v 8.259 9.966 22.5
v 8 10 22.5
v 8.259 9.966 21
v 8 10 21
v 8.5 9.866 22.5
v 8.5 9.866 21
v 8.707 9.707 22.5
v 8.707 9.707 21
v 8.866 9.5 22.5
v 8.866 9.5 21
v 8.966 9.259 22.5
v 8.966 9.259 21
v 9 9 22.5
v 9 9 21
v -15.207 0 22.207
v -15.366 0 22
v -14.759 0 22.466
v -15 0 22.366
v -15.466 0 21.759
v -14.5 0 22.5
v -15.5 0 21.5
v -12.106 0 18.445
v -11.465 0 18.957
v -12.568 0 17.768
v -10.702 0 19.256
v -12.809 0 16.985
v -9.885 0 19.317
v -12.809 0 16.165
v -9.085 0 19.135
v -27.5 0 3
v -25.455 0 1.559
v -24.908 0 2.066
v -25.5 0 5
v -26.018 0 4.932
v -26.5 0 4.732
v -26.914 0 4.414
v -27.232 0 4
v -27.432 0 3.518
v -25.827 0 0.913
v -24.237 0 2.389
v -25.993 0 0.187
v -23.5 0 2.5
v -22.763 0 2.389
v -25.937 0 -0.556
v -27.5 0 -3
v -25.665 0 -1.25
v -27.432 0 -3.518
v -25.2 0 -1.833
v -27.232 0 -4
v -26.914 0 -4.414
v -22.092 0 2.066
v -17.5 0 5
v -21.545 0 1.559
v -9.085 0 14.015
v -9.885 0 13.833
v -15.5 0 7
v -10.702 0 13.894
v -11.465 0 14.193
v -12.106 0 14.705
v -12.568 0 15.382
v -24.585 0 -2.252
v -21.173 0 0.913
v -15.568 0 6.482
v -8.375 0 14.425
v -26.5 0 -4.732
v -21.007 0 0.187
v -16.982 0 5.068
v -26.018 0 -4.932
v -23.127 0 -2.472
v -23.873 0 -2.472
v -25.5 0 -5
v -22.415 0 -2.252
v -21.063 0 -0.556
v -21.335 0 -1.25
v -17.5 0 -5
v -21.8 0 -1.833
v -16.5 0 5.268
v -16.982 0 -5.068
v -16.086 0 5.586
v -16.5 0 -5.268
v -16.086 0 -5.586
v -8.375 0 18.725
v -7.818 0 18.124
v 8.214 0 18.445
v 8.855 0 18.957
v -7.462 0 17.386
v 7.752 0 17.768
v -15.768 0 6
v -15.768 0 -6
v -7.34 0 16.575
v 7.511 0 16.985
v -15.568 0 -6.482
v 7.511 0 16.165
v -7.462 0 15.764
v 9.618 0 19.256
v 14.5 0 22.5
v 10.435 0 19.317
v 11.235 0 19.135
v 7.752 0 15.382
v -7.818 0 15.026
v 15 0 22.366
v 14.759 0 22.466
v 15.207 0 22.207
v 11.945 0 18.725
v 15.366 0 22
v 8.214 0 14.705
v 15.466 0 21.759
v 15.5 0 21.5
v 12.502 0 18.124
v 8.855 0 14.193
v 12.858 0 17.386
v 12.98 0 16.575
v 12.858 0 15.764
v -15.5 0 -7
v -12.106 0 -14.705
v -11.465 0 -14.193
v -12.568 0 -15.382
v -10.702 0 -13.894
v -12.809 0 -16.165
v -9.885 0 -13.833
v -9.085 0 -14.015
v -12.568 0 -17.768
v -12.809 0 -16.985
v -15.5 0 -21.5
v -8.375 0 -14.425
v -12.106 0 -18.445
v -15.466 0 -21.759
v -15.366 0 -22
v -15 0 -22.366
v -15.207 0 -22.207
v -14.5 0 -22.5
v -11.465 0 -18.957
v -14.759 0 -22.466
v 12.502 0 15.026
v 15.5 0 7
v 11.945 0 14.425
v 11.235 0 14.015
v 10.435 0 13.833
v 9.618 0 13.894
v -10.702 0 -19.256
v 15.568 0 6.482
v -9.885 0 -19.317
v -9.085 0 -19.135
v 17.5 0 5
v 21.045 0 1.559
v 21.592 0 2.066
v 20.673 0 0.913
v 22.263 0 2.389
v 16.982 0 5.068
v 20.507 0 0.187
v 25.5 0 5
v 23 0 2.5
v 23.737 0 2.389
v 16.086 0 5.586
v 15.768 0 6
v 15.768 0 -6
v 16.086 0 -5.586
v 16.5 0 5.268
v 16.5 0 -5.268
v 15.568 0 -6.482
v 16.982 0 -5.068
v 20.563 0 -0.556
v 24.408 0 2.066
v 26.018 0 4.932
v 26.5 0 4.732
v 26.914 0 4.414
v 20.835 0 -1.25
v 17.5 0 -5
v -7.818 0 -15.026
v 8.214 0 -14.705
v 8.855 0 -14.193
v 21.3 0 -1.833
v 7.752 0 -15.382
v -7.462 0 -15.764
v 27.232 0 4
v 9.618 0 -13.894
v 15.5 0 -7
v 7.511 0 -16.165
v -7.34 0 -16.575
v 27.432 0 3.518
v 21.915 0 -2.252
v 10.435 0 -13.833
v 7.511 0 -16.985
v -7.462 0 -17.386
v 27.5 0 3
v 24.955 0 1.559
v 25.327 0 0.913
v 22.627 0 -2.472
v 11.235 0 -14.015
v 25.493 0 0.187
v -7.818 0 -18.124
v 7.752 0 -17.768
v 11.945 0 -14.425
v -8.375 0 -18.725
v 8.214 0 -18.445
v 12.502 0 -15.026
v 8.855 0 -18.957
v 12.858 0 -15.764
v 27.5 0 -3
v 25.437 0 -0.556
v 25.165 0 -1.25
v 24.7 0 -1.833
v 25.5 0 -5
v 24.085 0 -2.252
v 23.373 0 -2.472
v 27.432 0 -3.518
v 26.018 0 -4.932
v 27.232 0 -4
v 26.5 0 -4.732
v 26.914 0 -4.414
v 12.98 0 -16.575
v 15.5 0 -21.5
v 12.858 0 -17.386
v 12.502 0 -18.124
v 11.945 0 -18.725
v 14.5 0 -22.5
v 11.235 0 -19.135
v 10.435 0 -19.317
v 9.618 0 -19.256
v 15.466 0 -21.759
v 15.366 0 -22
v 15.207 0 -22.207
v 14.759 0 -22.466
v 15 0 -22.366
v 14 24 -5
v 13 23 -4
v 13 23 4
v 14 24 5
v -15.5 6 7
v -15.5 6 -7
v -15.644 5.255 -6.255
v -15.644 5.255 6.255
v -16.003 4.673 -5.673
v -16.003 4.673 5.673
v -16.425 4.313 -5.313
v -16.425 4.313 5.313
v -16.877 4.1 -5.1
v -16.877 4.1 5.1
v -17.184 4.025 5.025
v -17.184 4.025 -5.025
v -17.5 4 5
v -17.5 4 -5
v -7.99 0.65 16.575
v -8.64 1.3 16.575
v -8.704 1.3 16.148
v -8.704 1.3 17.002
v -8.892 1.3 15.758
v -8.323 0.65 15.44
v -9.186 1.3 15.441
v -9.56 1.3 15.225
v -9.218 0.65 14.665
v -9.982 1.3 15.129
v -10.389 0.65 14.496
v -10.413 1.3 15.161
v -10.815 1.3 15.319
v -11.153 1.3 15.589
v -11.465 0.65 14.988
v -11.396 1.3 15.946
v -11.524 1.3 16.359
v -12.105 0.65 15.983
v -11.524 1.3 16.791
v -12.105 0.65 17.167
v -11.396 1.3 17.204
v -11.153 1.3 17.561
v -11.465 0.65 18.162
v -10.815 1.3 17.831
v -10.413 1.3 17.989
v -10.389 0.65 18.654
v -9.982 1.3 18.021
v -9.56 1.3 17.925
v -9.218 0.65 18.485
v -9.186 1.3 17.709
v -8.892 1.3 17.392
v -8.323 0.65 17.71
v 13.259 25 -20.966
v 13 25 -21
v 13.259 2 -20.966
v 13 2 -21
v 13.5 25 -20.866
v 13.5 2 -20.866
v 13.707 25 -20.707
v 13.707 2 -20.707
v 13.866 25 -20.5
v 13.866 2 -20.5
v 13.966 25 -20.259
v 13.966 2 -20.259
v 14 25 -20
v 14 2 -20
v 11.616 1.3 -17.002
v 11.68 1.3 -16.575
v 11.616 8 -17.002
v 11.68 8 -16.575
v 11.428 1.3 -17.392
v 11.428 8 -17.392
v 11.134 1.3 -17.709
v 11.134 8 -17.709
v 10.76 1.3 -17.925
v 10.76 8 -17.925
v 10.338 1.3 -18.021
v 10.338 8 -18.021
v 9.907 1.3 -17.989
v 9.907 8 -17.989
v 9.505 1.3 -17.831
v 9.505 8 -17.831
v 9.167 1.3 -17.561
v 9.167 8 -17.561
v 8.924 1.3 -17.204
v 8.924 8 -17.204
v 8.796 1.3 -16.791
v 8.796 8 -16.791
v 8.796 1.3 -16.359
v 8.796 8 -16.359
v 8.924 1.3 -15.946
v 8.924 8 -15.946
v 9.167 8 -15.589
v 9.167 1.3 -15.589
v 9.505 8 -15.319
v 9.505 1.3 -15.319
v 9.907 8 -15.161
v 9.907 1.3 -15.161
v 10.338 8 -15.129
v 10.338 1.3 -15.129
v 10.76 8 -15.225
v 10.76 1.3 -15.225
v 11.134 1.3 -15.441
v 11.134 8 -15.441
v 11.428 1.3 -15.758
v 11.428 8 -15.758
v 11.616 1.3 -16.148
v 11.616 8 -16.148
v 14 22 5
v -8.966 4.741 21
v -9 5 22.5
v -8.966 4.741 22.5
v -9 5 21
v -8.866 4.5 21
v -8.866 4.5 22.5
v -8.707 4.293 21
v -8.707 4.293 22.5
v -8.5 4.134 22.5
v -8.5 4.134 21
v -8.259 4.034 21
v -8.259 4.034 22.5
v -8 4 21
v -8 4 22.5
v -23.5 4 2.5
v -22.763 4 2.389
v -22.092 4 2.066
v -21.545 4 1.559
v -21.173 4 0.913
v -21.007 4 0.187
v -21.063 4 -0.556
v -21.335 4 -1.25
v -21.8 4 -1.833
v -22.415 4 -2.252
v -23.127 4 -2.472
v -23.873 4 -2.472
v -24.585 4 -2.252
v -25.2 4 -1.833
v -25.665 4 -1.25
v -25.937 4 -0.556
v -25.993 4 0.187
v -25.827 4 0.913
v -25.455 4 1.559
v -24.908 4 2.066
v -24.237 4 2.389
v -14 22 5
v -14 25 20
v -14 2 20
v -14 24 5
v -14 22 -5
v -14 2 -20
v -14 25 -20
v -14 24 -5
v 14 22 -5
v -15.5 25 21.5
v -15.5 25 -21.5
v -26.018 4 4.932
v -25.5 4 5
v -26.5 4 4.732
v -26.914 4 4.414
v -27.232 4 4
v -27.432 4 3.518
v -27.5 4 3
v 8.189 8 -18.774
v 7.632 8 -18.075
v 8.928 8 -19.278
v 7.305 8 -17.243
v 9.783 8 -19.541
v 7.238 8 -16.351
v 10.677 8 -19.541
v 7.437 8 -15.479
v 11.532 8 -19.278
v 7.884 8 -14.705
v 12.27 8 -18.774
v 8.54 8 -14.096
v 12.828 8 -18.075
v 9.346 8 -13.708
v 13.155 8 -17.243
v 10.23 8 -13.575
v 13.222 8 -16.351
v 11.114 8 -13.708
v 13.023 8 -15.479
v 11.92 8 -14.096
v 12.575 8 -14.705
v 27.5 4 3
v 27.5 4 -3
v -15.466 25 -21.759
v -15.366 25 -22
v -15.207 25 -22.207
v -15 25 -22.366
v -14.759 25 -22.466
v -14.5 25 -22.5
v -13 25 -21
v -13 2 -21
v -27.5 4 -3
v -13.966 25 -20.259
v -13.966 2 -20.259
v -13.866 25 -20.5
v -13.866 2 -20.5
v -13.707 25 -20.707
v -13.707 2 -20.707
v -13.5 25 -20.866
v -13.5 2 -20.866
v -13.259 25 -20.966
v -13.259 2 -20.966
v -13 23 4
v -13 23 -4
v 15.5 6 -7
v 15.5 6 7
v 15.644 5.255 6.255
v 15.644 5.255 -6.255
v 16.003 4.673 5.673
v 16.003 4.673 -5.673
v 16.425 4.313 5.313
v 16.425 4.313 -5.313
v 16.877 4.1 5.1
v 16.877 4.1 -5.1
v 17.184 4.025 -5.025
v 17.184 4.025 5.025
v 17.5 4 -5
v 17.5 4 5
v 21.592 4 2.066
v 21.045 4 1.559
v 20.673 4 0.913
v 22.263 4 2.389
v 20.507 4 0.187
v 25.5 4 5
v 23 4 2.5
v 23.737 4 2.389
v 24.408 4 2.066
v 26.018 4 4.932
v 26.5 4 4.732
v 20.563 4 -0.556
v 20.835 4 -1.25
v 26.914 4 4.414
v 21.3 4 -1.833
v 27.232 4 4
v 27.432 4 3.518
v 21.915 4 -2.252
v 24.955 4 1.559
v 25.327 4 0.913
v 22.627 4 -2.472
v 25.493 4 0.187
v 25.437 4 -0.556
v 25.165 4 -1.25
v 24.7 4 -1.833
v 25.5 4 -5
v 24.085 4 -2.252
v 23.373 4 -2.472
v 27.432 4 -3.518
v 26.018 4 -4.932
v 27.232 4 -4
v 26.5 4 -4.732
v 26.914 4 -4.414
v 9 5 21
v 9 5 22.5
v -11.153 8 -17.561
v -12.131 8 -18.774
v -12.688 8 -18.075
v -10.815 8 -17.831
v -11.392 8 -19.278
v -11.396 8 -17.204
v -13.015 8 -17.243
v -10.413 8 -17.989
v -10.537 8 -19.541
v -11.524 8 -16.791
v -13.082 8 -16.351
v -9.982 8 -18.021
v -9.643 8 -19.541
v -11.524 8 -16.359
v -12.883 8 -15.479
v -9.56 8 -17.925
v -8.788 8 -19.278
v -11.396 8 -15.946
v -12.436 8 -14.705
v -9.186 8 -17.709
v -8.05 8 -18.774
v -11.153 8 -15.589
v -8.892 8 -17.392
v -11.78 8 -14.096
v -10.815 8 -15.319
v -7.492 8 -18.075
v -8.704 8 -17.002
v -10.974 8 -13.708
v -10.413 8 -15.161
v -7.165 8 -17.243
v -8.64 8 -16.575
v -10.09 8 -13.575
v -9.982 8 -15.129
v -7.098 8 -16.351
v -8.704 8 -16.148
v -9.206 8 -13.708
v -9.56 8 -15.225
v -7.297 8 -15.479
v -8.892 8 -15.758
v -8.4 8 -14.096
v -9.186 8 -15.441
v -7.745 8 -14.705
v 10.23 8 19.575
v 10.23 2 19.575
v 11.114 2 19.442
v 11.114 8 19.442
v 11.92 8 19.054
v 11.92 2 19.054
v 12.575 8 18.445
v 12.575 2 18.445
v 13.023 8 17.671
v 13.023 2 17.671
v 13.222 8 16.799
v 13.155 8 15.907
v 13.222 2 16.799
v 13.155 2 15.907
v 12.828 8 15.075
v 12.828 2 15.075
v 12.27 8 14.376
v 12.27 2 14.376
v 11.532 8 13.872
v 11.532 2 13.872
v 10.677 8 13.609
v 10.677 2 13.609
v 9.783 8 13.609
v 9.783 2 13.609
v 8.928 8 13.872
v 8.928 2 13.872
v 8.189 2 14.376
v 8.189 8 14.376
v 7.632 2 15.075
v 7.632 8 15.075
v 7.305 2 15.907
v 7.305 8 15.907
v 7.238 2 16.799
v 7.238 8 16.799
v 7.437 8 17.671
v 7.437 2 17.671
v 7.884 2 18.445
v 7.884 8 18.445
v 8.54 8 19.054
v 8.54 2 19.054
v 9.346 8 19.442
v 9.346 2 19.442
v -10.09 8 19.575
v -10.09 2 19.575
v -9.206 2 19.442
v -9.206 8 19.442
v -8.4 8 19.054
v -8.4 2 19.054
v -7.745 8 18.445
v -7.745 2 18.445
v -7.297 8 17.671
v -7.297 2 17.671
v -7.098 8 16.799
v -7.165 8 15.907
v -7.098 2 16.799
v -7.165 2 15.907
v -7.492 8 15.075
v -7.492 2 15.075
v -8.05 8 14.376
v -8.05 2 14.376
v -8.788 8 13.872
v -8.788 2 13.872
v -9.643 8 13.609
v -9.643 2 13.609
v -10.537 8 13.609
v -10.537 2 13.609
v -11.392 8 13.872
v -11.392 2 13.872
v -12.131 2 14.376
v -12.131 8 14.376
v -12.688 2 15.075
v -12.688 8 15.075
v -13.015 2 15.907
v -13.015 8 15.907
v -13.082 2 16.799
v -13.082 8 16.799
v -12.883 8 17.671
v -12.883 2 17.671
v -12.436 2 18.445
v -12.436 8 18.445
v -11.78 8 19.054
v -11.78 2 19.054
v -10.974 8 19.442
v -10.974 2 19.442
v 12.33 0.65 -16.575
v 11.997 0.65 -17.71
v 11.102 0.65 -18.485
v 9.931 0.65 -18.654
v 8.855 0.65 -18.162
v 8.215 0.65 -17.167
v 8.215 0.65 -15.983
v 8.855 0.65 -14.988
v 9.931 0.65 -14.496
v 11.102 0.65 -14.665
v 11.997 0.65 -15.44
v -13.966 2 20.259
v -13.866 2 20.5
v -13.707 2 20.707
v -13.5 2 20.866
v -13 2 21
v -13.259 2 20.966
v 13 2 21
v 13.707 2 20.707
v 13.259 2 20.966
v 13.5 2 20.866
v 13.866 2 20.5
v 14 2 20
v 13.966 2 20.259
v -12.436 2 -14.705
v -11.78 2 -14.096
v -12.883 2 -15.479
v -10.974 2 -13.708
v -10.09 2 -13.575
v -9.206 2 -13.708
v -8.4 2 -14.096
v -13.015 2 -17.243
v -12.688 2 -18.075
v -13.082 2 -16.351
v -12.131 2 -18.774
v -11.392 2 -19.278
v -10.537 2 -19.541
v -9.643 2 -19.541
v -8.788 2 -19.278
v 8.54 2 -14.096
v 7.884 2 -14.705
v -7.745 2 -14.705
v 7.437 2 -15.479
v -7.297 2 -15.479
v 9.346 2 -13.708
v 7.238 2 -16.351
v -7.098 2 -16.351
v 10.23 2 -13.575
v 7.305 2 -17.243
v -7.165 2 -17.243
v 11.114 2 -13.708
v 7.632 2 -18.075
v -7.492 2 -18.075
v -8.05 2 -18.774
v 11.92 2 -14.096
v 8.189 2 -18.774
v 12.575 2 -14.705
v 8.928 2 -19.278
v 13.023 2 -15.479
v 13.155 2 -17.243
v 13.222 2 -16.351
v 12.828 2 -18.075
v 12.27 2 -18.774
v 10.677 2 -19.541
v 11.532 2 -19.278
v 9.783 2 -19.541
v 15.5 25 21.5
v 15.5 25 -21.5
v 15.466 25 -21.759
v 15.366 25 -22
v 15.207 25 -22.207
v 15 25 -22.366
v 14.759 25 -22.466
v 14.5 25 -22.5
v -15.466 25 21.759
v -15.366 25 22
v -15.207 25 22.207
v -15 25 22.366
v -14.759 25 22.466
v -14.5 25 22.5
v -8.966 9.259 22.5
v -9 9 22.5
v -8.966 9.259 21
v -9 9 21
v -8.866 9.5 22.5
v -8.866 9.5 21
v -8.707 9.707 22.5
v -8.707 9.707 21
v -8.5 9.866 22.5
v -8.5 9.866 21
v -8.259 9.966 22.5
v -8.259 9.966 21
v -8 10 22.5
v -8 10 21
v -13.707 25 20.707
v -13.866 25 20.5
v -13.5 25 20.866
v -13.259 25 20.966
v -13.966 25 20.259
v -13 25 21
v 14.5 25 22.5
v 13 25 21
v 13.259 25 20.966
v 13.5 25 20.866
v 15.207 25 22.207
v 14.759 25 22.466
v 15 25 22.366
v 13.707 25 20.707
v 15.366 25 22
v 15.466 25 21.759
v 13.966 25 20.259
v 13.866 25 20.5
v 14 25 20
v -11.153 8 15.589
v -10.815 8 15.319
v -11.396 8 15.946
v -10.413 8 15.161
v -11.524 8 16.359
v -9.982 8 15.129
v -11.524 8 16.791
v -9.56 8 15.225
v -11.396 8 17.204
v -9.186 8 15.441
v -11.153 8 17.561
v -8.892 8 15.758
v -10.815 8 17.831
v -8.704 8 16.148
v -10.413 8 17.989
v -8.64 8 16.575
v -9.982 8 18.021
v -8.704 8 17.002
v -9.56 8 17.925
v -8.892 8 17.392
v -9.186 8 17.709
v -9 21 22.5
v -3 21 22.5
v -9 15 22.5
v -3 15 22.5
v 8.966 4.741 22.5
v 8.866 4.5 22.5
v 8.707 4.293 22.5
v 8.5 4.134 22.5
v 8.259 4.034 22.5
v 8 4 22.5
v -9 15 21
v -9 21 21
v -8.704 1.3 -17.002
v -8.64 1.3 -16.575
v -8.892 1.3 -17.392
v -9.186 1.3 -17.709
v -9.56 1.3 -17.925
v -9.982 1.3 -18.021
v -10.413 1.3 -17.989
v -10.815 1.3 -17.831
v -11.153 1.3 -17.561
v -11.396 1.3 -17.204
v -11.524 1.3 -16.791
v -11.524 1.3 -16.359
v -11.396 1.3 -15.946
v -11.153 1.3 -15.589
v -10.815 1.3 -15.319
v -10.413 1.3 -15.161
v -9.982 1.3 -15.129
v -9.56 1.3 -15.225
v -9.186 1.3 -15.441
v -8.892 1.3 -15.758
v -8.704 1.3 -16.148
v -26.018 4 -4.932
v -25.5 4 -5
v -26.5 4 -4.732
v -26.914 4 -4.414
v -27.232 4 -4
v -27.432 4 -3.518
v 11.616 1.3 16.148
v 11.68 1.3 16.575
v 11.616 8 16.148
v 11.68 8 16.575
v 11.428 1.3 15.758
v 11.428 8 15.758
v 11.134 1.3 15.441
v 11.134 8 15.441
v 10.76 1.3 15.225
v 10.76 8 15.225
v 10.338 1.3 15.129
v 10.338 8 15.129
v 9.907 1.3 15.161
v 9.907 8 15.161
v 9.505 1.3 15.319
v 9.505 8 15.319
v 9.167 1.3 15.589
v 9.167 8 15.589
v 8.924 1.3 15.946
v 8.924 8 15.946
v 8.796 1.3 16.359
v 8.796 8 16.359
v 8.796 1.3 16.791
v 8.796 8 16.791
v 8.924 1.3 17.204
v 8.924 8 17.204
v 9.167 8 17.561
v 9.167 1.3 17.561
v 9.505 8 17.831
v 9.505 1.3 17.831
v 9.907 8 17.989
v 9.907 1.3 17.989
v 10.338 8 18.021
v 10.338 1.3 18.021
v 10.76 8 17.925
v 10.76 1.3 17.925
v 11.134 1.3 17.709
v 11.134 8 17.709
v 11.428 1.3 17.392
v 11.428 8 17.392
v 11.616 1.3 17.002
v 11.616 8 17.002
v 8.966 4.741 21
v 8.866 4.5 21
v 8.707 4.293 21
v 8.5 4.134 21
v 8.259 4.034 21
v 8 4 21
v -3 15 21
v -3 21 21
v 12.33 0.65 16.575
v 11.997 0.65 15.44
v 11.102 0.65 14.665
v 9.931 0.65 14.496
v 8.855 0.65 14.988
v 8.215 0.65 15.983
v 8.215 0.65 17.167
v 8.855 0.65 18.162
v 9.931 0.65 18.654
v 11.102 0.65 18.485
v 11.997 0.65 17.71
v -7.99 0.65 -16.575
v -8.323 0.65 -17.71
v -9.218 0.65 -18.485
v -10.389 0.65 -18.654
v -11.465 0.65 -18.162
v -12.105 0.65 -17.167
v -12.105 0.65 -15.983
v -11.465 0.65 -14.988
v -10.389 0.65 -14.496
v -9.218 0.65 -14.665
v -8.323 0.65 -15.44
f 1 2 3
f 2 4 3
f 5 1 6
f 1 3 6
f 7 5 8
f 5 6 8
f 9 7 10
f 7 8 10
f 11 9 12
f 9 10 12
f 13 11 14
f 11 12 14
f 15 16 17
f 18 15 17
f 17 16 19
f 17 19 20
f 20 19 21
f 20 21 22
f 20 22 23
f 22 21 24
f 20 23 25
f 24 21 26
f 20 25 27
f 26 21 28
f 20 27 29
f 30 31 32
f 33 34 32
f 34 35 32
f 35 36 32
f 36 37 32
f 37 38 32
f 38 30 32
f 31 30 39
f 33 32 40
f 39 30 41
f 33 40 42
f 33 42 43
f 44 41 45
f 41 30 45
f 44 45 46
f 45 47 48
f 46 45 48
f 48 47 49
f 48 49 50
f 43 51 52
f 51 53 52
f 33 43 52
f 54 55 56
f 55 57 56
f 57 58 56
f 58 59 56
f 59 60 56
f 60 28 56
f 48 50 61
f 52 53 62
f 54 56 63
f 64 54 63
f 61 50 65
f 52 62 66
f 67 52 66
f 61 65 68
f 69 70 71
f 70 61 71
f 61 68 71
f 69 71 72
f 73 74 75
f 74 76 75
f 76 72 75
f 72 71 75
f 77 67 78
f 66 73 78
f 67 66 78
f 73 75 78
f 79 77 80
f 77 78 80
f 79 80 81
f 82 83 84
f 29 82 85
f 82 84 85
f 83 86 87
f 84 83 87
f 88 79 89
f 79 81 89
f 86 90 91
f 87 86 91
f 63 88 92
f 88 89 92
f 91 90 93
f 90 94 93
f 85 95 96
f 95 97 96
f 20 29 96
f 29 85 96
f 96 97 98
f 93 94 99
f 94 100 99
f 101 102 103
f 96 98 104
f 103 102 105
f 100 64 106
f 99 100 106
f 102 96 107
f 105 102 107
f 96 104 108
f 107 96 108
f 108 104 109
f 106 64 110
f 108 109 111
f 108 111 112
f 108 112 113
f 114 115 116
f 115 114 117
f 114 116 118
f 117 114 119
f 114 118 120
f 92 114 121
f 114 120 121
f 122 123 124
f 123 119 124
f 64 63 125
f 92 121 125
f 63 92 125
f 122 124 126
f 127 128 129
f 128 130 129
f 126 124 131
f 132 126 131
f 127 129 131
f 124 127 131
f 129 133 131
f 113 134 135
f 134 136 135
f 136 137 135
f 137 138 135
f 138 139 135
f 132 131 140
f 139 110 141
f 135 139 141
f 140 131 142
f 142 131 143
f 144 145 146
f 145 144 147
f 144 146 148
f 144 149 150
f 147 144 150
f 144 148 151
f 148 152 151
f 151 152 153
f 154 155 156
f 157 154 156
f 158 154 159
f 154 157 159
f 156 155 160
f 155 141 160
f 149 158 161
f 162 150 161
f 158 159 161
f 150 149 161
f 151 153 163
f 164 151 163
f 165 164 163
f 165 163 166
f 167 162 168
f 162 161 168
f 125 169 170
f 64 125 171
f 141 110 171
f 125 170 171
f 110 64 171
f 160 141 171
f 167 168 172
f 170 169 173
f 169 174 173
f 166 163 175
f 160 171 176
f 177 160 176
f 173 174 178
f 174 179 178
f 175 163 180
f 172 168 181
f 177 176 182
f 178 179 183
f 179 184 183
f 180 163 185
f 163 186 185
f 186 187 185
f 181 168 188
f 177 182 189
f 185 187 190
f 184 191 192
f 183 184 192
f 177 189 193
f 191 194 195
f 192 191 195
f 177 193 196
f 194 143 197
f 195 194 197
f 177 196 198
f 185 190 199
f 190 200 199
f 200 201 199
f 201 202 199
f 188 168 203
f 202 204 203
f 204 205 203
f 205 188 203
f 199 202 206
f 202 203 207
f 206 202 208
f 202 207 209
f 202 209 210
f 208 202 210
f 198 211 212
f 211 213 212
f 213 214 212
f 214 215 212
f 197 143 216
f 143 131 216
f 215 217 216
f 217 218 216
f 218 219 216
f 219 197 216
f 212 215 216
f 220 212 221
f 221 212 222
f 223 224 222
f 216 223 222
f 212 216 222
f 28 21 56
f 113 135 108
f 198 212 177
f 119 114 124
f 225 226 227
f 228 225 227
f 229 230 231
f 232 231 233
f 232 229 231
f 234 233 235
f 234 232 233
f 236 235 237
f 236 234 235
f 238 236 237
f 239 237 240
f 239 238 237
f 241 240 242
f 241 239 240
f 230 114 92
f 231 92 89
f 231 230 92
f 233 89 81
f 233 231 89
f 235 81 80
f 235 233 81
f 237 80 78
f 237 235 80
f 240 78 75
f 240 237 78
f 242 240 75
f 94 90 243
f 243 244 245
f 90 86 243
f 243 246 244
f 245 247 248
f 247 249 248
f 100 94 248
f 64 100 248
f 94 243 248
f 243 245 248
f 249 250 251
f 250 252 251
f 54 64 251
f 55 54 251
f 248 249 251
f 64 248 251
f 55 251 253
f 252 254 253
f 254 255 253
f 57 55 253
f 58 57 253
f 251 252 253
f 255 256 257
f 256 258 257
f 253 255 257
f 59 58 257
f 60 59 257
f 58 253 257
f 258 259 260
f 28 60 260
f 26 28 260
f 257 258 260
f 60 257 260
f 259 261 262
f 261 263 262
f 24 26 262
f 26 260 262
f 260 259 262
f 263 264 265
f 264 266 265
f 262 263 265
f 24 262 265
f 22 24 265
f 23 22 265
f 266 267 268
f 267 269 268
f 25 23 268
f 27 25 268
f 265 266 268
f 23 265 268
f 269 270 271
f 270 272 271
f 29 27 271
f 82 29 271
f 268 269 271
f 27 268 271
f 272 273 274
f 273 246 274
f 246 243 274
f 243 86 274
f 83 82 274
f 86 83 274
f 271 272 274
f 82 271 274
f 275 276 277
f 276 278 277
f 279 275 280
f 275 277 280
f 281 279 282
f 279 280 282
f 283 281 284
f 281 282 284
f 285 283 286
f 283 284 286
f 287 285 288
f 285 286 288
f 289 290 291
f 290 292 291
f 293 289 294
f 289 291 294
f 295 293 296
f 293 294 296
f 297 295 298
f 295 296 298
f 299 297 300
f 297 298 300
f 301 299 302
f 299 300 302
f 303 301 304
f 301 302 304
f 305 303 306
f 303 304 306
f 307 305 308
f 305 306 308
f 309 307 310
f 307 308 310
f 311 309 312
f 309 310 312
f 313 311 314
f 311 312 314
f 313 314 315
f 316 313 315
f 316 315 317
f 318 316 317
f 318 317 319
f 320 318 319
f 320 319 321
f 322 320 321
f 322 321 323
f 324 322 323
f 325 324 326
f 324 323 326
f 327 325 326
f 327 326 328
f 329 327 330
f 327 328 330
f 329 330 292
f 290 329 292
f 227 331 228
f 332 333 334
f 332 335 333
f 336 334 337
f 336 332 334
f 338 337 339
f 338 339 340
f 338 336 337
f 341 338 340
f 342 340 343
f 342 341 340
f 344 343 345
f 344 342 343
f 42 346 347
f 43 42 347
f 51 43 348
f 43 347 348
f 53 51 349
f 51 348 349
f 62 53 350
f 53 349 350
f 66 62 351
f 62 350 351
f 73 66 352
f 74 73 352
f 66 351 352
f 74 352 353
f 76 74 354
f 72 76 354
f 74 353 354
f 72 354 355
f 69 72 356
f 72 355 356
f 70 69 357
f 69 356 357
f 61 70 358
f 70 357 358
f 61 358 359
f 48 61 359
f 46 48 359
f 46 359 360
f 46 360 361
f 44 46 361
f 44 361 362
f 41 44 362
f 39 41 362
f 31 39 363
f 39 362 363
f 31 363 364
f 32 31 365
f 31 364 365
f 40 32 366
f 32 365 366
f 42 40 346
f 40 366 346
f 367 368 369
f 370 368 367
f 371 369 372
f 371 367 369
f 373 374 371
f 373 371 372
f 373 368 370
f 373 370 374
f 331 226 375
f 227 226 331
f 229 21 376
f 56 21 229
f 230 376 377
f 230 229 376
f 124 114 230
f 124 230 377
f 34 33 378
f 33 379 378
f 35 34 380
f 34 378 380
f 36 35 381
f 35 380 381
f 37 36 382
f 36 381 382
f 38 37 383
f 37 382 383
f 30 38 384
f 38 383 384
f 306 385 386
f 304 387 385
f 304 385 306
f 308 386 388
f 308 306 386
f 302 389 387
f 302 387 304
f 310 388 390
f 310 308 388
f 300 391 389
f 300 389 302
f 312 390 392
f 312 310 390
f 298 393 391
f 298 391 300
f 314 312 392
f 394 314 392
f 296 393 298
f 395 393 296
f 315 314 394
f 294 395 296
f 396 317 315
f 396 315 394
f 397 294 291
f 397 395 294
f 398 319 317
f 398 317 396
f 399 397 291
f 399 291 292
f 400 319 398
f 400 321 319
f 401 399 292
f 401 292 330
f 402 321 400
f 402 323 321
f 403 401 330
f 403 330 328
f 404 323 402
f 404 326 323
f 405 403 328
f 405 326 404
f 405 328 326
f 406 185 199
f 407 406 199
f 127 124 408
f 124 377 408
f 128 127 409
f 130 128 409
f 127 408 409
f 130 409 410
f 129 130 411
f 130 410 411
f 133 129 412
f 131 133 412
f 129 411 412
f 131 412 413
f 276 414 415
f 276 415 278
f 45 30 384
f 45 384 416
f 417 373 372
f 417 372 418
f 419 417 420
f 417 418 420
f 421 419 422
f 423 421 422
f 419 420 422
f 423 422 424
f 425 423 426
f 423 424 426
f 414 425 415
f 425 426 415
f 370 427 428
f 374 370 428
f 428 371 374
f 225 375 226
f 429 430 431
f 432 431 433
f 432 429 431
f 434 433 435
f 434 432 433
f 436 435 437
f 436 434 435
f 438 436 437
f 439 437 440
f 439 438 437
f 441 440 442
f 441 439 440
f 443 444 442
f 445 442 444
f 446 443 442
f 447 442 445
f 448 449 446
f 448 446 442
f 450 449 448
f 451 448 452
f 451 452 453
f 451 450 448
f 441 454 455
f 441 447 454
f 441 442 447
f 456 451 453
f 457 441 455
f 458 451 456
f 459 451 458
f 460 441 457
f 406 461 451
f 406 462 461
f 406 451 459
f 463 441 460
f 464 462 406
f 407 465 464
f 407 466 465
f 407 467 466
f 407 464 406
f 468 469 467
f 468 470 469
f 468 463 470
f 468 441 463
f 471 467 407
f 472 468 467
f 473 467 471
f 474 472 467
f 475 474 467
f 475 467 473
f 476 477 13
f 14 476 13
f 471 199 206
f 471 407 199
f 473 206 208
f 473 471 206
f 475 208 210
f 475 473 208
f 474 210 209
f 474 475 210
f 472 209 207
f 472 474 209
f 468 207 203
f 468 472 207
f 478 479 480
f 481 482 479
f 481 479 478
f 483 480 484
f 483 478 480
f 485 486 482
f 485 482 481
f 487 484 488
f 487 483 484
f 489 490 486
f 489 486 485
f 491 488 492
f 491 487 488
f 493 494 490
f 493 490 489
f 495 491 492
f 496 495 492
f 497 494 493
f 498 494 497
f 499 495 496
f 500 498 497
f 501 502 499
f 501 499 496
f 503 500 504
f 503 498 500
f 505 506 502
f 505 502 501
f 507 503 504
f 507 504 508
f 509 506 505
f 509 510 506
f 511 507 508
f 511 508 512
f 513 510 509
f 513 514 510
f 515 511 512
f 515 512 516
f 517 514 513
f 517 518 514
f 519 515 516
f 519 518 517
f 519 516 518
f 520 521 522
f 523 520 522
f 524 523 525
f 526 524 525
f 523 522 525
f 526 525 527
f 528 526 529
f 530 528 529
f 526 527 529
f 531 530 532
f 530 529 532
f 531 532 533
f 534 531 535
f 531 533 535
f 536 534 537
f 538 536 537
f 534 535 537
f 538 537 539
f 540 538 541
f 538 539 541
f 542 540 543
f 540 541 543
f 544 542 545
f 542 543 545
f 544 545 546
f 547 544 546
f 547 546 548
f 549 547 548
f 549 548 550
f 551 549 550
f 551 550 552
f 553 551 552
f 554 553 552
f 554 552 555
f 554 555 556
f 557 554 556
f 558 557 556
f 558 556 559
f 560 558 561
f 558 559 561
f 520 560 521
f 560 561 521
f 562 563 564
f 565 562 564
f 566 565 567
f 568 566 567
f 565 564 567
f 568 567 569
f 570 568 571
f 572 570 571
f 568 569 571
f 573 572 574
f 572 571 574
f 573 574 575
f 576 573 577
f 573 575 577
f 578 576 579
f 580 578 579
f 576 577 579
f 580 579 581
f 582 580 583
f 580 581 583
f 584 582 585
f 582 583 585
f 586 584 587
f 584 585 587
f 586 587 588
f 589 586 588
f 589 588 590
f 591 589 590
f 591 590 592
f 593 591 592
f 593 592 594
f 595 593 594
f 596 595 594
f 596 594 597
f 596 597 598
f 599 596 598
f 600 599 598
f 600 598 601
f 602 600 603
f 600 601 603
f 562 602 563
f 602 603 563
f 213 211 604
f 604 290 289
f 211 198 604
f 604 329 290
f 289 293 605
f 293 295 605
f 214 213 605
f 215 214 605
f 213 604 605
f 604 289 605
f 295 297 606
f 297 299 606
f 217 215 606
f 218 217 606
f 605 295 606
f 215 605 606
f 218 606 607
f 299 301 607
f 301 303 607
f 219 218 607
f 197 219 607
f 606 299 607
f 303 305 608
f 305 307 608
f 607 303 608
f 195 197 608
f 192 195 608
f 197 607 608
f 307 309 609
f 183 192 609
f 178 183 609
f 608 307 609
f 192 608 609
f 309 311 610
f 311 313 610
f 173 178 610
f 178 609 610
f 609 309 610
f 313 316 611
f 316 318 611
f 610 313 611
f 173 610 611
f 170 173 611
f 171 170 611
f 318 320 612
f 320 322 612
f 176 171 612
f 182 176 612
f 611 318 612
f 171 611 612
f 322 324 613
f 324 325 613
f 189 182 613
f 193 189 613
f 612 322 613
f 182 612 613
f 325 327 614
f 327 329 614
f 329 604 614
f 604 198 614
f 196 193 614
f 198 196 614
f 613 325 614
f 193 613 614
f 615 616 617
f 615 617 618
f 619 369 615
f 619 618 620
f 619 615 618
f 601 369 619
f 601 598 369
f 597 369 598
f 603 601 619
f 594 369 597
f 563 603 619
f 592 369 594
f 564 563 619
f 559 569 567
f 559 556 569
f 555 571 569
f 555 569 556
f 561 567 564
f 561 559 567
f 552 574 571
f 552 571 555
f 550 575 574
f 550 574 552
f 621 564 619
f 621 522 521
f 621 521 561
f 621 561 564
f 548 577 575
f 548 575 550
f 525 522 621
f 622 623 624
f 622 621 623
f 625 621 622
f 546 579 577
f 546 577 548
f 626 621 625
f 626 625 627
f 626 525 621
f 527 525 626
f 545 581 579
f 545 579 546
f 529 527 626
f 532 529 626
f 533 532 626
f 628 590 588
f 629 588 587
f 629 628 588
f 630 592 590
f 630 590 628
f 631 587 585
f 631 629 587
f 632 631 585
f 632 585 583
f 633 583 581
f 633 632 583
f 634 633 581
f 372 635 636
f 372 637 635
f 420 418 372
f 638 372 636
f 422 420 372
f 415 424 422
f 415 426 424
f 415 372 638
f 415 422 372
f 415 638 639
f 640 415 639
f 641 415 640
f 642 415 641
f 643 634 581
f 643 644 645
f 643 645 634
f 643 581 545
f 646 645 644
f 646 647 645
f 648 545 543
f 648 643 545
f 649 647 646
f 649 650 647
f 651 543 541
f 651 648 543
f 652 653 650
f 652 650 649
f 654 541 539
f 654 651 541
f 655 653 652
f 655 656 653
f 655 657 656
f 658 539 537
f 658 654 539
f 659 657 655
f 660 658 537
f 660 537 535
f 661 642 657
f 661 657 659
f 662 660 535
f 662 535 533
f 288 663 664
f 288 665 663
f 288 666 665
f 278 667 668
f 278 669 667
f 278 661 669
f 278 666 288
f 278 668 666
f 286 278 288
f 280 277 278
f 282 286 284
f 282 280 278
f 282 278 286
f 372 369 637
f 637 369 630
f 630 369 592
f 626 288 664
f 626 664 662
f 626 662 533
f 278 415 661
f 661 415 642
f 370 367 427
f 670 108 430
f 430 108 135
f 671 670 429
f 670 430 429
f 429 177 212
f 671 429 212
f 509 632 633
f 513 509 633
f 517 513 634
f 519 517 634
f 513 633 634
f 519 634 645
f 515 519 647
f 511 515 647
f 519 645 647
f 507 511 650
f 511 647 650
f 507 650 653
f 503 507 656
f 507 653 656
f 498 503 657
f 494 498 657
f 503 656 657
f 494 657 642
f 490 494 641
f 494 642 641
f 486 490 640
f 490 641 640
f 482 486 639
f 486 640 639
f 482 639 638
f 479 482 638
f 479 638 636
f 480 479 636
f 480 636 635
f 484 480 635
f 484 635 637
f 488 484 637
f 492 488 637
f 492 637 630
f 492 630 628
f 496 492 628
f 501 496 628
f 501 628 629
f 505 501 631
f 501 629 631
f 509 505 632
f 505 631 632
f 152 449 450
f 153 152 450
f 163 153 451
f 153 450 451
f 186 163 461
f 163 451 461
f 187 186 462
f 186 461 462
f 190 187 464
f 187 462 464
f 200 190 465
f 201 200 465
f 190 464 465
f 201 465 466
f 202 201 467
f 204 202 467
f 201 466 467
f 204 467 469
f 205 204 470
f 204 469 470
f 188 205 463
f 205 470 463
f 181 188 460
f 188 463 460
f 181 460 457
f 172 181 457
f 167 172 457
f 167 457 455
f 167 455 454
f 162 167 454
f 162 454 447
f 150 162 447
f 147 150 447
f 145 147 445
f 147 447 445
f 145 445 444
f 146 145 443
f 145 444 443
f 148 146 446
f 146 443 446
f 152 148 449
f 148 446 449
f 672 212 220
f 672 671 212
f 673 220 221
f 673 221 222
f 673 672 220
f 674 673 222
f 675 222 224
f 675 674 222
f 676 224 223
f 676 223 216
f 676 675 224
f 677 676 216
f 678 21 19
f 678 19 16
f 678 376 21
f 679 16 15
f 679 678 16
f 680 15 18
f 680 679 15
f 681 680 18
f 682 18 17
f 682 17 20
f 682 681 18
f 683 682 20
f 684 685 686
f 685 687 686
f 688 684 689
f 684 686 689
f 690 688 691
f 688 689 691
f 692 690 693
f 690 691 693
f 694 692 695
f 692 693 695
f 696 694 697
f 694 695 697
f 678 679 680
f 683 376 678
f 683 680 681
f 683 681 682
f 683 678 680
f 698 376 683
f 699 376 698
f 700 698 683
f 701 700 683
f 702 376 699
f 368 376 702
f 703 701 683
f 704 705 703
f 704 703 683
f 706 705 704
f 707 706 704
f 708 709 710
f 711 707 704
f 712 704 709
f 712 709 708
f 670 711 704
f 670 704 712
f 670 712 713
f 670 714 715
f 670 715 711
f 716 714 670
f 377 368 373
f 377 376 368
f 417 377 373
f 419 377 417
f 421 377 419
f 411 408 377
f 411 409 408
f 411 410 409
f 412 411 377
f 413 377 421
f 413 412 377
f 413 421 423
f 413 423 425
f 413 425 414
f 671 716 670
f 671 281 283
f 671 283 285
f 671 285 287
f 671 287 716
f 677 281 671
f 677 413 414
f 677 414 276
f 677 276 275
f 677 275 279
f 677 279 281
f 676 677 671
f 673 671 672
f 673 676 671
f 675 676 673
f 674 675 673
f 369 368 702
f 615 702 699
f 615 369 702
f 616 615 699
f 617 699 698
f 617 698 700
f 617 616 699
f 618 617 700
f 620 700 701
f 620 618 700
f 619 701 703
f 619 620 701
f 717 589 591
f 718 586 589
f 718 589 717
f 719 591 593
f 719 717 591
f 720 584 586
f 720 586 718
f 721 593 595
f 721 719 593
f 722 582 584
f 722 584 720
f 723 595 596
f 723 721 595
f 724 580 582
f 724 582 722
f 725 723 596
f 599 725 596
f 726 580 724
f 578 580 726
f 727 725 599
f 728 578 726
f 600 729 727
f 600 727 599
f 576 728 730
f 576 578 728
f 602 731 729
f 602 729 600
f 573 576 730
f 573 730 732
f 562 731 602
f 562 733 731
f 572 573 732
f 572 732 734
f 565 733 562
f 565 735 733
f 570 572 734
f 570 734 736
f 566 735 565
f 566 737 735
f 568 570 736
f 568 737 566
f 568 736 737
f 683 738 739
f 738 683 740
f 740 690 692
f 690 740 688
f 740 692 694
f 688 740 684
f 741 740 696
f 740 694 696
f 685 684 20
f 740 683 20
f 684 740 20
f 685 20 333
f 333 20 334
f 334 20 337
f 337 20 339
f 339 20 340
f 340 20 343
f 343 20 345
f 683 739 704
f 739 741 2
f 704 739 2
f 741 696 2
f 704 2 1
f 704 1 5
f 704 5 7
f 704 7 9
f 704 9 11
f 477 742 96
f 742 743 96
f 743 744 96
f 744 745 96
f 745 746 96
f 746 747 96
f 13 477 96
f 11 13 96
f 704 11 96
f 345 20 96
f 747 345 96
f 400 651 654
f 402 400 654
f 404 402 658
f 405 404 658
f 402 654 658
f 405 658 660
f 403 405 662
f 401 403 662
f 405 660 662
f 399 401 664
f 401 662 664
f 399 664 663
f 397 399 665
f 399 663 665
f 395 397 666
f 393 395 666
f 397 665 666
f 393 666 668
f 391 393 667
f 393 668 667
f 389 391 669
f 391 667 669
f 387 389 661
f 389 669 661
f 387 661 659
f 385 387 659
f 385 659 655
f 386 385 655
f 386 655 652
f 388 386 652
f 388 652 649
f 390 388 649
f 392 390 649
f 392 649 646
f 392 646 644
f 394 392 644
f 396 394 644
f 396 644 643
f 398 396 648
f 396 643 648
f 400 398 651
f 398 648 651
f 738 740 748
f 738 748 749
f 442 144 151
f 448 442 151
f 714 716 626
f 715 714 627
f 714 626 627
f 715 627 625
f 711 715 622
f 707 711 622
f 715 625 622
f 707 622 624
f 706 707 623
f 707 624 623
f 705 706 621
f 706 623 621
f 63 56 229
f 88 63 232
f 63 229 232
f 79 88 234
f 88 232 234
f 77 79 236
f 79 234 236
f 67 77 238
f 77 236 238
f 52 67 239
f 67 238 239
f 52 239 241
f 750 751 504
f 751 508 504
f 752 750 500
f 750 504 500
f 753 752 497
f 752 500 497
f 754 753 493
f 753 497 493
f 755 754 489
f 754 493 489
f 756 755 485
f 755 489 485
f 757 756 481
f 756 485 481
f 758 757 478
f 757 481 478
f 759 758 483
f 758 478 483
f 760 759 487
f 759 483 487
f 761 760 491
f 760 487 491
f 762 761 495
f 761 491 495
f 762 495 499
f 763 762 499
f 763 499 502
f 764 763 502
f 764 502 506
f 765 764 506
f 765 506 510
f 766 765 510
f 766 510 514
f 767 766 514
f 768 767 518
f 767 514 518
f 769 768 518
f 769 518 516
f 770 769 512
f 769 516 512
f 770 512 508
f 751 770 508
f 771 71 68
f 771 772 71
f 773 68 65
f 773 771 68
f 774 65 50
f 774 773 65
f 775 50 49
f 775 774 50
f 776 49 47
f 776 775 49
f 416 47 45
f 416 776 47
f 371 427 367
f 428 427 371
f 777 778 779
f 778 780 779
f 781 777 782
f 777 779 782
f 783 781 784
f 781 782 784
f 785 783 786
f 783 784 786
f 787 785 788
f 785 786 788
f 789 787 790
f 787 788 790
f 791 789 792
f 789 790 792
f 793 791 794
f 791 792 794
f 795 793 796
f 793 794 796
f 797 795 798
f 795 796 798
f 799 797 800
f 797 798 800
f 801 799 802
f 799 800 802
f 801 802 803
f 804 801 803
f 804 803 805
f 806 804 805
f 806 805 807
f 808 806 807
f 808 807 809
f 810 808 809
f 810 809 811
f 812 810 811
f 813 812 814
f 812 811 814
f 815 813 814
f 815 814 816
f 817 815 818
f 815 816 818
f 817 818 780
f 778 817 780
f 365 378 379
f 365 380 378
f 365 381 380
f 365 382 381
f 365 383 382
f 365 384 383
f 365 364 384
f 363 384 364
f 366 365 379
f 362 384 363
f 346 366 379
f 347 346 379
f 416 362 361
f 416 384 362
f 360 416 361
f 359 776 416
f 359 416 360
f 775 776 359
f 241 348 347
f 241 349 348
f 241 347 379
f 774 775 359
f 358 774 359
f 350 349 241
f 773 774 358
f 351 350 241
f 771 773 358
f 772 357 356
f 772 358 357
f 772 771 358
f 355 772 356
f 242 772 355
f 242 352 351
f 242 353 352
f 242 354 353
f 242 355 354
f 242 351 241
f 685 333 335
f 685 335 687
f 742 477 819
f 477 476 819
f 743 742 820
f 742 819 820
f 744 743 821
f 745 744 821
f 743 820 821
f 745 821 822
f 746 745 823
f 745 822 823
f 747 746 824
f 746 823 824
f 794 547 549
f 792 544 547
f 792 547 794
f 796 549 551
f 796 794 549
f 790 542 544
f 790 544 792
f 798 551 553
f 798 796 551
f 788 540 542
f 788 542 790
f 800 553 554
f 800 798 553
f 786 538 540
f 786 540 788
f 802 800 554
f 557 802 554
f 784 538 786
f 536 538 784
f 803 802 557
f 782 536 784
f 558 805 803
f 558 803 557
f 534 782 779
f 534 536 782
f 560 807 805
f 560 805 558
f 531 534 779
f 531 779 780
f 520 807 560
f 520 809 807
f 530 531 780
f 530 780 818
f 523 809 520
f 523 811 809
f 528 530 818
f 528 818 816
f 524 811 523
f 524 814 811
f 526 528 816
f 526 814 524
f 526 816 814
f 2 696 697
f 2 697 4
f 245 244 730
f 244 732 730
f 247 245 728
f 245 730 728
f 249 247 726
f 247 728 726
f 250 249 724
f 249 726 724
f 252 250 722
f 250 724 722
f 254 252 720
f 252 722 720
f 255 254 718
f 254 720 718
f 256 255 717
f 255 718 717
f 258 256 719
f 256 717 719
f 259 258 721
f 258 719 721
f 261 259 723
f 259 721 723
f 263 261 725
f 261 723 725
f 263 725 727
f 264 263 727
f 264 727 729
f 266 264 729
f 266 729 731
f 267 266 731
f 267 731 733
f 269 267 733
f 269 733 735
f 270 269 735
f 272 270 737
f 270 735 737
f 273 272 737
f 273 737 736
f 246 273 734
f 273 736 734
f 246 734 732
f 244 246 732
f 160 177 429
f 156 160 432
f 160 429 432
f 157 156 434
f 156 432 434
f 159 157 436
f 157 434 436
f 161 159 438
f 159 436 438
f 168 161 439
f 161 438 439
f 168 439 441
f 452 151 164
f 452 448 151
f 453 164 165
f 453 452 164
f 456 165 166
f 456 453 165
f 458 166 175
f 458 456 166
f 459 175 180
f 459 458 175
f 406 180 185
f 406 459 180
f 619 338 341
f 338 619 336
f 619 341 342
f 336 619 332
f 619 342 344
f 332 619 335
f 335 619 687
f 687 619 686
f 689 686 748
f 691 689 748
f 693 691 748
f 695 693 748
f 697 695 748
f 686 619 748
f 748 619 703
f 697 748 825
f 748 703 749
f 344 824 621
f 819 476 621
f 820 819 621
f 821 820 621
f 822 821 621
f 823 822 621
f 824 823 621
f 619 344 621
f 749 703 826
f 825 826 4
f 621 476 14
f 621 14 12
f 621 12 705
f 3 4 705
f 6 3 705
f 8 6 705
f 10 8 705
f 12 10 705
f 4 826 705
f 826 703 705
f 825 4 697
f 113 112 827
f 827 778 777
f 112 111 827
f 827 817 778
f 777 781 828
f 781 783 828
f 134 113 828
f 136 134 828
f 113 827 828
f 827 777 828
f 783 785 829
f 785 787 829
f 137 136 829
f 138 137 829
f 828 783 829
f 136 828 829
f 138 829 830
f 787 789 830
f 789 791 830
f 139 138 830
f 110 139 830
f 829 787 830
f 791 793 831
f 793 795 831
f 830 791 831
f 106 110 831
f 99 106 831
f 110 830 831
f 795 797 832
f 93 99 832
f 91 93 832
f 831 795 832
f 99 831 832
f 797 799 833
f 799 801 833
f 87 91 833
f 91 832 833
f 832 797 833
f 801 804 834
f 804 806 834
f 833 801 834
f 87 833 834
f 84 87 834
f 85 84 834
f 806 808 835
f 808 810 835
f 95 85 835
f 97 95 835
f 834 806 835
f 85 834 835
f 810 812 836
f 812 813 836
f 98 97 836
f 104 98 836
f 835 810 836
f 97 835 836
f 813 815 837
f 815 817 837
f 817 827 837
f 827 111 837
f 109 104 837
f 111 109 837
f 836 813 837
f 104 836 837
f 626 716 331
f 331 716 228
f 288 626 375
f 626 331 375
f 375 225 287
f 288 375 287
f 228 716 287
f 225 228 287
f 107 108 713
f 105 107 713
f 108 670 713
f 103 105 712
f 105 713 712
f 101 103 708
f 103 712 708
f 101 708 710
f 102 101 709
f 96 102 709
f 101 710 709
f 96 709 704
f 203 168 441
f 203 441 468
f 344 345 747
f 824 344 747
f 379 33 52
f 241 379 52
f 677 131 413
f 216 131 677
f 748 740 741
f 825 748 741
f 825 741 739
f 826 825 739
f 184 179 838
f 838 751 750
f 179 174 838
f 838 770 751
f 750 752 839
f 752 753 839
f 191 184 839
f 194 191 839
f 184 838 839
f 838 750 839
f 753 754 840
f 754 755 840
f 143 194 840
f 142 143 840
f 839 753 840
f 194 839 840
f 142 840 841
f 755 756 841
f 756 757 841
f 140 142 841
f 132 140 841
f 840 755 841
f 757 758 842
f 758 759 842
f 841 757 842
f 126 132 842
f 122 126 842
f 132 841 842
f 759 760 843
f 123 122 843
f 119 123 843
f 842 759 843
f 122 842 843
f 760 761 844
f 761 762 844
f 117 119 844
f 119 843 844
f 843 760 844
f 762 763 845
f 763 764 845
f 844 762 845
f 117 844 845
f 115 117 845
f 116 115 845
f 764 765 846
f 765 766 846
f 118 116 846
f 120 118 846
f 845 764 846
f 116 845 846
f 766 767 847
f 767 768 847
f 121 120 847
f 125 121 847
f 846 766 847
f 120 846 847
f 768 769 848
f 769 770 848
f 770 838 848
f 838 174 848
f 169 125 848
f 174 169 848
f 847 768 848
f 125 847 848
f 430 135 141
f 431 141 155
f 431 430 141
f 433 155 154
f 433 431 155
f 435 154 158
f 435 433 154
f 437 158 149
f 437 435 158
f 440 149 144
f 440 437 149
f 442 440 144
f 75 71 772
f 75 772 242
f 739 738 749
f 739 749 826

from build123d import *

# Parameters (mm, degrees)
SKETCH1_W                                         = 31
SKETCH1_H                                         = 45
BOSS_EXTRUDE1_DEPTH                               = 25
SKETCH2_W                                         = 28
SKETCH2_H                                         = 42
CUT_EXTRUDE1_DEPTH                                = 23
SKETCH3_R                                         = 3
BOSS_EXTRUDE5_DEPTH                               = 6
SKETCH4_W                                         = 18
SKETCH4_H                                         = 6
SKETCH4_W_2                                       = 6
CUT_EXTRUDE2_DEPTH                                = 1.5
CSK_FOR_M2_5_FLAT_HEAD_MACHINE_SCREW1_D           = 2.9
CSK_FOR_M2_5_FLAT_HEAD_MACHINE_SCREW1_CSINK_D     = 5.5
CSK_FOR_M2_5_FLAT_HEAD_MACHINE_SCREW1_CSINK_ANGLE = 90
FILLET2_R                                         = 1
SKETCH8_W                                         = 12
SKETCH8_H                                         = 10
BOSS_EXTRUDE6_DEPTH                               = 4
SKETCH9_R                                         = 2.5
CUT_EXTRUDE3_DEPTH                                = 4
FILLET3_R                                         = 2
FILLET4_R                                         = 2
SKETCH10_W                                        = 10
SKETCH10_H                                        = 2
BOSS_EXTRUDE7_DEPTH                               = 1
CHAMFER1_SIZE                                     = 1
SKETCH11_W                                        = 10
SKETCH11_H                                        = 2
BOSS_EXTRUDE8_DEPTH                               = 1
CHAMFER2_SIZE                                     = 1
FILLET5_R                                         = 2


with BuildPart() as part:
    # Sketch1 → Boss-Extrude1 (new body)
    with BuildSketch(Plane(origin=(0, 0, 0), x_dir=(1, 0, 0), z_dir=(0, 1, 0))):
        Rectangle(SKETCH1_W, SKETCH1_H)
    extrude(amount=BOSS_EXTRUDE1_DEPTH)

    # Sketch2 → Cut-Extrude1 (cut)
    with BuildSketch(Plane(origin=(0, 25, 0), x_dir=(1, 0, 0), z_dir=(0, 1, 0))):
        Rectangle(SKETCH2_W, SKETCH2_H)
    extrude(amount=-CUT_EXTRUDE1_DEPTH, mode=Mode.SUBTRACT)

    # Sketch3 → Boss-Extrude5 (add)
    with BuildSketch(Plane(origin=(0, 2, 0), x_dir=(1, 0, 0), z_dir=(0, 1, 0))):
        with Locations(Location((-10.090049644, 16.575, 0), (0, 0, 270))):
            Circle(SKETCH3_R)
        with Locations(Location((10.229950356, 16.575, 0), (0, 0, 270))):
            Circle(SKETCH3_R)
        with Locations(Location((10.229950356, -16.575, 0), (0, 0, 270))):
            Circle(SKETCH3_R)
        with Locations(Location((-10.090049644, -16.575, 0), (0, 0, 270))):
            Circle(SKETCH3_R)
    extrude(amount=BOSS_EXTRUDE5_DEPTH)

    # Sketch4 → Cut-Extrude2 (cut)
    with BuildSketch(Plane.XY.offset(22.5)):
        with Locations((0, 7)):
            Rectangle(SKETCH4_W, SKETCH4_H)
        with Locations((-6, 18)):
            Rectangle(SKETCH4_W_2, SKETCH4_H)
    extrude(amount=-CUT_EXTRUDE2_DEPTH, mode=Mode.SUBTRACT)

    # CSK for M2.5 Flat Head Machine Screw1 (through all)
    with Locations(Plane(origin=(0, 0, 0), x_dir=(-1, 0, 0), z_dir=(0, -1, 0))):
        with Locations((-10.229950356, -16.575), (10.090049644, -16.575), (10.090049644, 16.575), (-10.229950356, 16.575)):
            CounterSinkHole(CSK_FOR_M2_5_FLAT_HEAD_MACHINE_SCREW1_D / 2, CSK_FOR_M2_5_FLAT_HEAD_MACHINE_SCREW1_CSINK_D / 2, counter_sink_angle=CSK_FOR_M2_5_FLAT_HEAD_MACHINE_SCREW1_CSINK_ANGLE)

    # Fillet2
    fillet2_edges = [part.edges().sort_by_distance(p)[0] for p in [
        (14, 13.5, -21),
        (14, 13.5, 21),
        (-14, 13.5, 21),
        (-14, 13.5, -21),
        (-9, 4, 21.75),
        (-9, 10, 21.75),
        (9, 10, 21.75),
        (9, 4, 21.75),
        (15.5, 12.5, 22.5),
        (-15.5, 12.5, 22.5),
        (-15.5, 12.5, -22.5),
        (15.5, 12.5, -22.5),
    ]]
    fillet(fillet2_edges, radius=FILLET2_R)

    # Sketch8 → Boss-Extrude6 (add)
    with BuildSketch(Plane(origin=(0, 0, 0), x_dir=(1, 0, 0), z_dir=(0, 1, 0))):
        with Locations((21.5, 0)):
            Rectangle(SKETCH8_W, SKETCH8_H)
        with Locations((-21.5, 0)):
            Rectangle(SKETCH8_W, SKETCH8_H)
    extrude(amount=BOSS_EXTRUDE6_DEPTH)

    # Sketch9 → Cut-Extrude3 (cut)
    with BuildSketch(Plane(origin=(0, 4, 0), x_dir=(1, 0, 0), z_dir=(0, 1, 0))):
        with Locations(Location((23, 0, 0), (0, 0, 270))):
            Circle(SKETCH9_R)
        with Locations(Location((-23.5, 0, 0), (0, 0, 270))):
            Circle(SKETCH9_R)
    extrude(amount=-CUT_EXTRUDE3_DEPTH, mode=Mode.SUBTRACT)

    # Fillet3
    fillet3_edges = [part.edges().sort_by_distance(p)[0] for p in [
        (-15.5, 2, 5),
        (-15.5, 2, -5),
        (15.5, 2, -5),
        (15.5, 2, 5),
    ]]
    fillet(fillet3_edges, radius=FILLET3_R)

    # Fillet4
    fillet4_edges = [part.edges().sort_by_distance(p)[0] for p in [
        (15.5, 4, 0),
        (-15.5, 4, 0),
    ]]
    fillet(fillet4_edges, radius=FILLET4_R)

    # Sketch10 → Boss-Extrude7 (add)
    with BuildSketch(Plane(origin=(-14, 0, 0), x_dir=(0, 0, -1), z_dir=(1, 0, 0))):
        with Locations((0, 23)):
            Rectangle(SKETCH10_W, SKETCH10_H)
    extrude(amount=BOSS_EXTRUDE7_DEPTH)

    # Chamfer1
    chamfer1_edges = [part.edges().sort_by_distance(p)[0] for p in [
        (-13, 23, 5),
        (-13, 22, 0),
        (-13, 23, -5),
        (-13, 24, 0),
    ]]
    chamfer(chamfer1_edges, length=CHAMFER1_SIZE - 0.0001)  # a hair under: the kernel refuses the full size

    # Sketch11 → Boss-Extrude8 (add)
    with BuildSketch(Plane.ZY.offset(-14)):
        with Locations((0, 23)):
            Rectangle(SKETCH11_W, SKETCH11_H)
    extrude(amount=BOSS_EXTRUDE8_DEPTH)

    # Chamfer2
    chamfer2_edges = [part.edges().sort_by_distance(p)[0] for p in [
        (13, 23, 5),
        (13, 24, 0),
        (13, 22, 0),
        (13, 23, -5),
    ]]
    chamfer(chamfer2_edges, length=CHAMFER2_SIZE - 0.0001)  # a hair under: the kernel refuses the full size

    # Fillet5
    fillet5_edges = [part.edges().sort_by_distance(p)[0] for p in [
        (-27.5, 2, -5),
        (-27.5, 2, 5),
        (27.5, 2, 5),
        (27.5, 2, -5),
    ]]
    fillet(fillet5_edges, radius=FILLET5_R)


solid = part.part
